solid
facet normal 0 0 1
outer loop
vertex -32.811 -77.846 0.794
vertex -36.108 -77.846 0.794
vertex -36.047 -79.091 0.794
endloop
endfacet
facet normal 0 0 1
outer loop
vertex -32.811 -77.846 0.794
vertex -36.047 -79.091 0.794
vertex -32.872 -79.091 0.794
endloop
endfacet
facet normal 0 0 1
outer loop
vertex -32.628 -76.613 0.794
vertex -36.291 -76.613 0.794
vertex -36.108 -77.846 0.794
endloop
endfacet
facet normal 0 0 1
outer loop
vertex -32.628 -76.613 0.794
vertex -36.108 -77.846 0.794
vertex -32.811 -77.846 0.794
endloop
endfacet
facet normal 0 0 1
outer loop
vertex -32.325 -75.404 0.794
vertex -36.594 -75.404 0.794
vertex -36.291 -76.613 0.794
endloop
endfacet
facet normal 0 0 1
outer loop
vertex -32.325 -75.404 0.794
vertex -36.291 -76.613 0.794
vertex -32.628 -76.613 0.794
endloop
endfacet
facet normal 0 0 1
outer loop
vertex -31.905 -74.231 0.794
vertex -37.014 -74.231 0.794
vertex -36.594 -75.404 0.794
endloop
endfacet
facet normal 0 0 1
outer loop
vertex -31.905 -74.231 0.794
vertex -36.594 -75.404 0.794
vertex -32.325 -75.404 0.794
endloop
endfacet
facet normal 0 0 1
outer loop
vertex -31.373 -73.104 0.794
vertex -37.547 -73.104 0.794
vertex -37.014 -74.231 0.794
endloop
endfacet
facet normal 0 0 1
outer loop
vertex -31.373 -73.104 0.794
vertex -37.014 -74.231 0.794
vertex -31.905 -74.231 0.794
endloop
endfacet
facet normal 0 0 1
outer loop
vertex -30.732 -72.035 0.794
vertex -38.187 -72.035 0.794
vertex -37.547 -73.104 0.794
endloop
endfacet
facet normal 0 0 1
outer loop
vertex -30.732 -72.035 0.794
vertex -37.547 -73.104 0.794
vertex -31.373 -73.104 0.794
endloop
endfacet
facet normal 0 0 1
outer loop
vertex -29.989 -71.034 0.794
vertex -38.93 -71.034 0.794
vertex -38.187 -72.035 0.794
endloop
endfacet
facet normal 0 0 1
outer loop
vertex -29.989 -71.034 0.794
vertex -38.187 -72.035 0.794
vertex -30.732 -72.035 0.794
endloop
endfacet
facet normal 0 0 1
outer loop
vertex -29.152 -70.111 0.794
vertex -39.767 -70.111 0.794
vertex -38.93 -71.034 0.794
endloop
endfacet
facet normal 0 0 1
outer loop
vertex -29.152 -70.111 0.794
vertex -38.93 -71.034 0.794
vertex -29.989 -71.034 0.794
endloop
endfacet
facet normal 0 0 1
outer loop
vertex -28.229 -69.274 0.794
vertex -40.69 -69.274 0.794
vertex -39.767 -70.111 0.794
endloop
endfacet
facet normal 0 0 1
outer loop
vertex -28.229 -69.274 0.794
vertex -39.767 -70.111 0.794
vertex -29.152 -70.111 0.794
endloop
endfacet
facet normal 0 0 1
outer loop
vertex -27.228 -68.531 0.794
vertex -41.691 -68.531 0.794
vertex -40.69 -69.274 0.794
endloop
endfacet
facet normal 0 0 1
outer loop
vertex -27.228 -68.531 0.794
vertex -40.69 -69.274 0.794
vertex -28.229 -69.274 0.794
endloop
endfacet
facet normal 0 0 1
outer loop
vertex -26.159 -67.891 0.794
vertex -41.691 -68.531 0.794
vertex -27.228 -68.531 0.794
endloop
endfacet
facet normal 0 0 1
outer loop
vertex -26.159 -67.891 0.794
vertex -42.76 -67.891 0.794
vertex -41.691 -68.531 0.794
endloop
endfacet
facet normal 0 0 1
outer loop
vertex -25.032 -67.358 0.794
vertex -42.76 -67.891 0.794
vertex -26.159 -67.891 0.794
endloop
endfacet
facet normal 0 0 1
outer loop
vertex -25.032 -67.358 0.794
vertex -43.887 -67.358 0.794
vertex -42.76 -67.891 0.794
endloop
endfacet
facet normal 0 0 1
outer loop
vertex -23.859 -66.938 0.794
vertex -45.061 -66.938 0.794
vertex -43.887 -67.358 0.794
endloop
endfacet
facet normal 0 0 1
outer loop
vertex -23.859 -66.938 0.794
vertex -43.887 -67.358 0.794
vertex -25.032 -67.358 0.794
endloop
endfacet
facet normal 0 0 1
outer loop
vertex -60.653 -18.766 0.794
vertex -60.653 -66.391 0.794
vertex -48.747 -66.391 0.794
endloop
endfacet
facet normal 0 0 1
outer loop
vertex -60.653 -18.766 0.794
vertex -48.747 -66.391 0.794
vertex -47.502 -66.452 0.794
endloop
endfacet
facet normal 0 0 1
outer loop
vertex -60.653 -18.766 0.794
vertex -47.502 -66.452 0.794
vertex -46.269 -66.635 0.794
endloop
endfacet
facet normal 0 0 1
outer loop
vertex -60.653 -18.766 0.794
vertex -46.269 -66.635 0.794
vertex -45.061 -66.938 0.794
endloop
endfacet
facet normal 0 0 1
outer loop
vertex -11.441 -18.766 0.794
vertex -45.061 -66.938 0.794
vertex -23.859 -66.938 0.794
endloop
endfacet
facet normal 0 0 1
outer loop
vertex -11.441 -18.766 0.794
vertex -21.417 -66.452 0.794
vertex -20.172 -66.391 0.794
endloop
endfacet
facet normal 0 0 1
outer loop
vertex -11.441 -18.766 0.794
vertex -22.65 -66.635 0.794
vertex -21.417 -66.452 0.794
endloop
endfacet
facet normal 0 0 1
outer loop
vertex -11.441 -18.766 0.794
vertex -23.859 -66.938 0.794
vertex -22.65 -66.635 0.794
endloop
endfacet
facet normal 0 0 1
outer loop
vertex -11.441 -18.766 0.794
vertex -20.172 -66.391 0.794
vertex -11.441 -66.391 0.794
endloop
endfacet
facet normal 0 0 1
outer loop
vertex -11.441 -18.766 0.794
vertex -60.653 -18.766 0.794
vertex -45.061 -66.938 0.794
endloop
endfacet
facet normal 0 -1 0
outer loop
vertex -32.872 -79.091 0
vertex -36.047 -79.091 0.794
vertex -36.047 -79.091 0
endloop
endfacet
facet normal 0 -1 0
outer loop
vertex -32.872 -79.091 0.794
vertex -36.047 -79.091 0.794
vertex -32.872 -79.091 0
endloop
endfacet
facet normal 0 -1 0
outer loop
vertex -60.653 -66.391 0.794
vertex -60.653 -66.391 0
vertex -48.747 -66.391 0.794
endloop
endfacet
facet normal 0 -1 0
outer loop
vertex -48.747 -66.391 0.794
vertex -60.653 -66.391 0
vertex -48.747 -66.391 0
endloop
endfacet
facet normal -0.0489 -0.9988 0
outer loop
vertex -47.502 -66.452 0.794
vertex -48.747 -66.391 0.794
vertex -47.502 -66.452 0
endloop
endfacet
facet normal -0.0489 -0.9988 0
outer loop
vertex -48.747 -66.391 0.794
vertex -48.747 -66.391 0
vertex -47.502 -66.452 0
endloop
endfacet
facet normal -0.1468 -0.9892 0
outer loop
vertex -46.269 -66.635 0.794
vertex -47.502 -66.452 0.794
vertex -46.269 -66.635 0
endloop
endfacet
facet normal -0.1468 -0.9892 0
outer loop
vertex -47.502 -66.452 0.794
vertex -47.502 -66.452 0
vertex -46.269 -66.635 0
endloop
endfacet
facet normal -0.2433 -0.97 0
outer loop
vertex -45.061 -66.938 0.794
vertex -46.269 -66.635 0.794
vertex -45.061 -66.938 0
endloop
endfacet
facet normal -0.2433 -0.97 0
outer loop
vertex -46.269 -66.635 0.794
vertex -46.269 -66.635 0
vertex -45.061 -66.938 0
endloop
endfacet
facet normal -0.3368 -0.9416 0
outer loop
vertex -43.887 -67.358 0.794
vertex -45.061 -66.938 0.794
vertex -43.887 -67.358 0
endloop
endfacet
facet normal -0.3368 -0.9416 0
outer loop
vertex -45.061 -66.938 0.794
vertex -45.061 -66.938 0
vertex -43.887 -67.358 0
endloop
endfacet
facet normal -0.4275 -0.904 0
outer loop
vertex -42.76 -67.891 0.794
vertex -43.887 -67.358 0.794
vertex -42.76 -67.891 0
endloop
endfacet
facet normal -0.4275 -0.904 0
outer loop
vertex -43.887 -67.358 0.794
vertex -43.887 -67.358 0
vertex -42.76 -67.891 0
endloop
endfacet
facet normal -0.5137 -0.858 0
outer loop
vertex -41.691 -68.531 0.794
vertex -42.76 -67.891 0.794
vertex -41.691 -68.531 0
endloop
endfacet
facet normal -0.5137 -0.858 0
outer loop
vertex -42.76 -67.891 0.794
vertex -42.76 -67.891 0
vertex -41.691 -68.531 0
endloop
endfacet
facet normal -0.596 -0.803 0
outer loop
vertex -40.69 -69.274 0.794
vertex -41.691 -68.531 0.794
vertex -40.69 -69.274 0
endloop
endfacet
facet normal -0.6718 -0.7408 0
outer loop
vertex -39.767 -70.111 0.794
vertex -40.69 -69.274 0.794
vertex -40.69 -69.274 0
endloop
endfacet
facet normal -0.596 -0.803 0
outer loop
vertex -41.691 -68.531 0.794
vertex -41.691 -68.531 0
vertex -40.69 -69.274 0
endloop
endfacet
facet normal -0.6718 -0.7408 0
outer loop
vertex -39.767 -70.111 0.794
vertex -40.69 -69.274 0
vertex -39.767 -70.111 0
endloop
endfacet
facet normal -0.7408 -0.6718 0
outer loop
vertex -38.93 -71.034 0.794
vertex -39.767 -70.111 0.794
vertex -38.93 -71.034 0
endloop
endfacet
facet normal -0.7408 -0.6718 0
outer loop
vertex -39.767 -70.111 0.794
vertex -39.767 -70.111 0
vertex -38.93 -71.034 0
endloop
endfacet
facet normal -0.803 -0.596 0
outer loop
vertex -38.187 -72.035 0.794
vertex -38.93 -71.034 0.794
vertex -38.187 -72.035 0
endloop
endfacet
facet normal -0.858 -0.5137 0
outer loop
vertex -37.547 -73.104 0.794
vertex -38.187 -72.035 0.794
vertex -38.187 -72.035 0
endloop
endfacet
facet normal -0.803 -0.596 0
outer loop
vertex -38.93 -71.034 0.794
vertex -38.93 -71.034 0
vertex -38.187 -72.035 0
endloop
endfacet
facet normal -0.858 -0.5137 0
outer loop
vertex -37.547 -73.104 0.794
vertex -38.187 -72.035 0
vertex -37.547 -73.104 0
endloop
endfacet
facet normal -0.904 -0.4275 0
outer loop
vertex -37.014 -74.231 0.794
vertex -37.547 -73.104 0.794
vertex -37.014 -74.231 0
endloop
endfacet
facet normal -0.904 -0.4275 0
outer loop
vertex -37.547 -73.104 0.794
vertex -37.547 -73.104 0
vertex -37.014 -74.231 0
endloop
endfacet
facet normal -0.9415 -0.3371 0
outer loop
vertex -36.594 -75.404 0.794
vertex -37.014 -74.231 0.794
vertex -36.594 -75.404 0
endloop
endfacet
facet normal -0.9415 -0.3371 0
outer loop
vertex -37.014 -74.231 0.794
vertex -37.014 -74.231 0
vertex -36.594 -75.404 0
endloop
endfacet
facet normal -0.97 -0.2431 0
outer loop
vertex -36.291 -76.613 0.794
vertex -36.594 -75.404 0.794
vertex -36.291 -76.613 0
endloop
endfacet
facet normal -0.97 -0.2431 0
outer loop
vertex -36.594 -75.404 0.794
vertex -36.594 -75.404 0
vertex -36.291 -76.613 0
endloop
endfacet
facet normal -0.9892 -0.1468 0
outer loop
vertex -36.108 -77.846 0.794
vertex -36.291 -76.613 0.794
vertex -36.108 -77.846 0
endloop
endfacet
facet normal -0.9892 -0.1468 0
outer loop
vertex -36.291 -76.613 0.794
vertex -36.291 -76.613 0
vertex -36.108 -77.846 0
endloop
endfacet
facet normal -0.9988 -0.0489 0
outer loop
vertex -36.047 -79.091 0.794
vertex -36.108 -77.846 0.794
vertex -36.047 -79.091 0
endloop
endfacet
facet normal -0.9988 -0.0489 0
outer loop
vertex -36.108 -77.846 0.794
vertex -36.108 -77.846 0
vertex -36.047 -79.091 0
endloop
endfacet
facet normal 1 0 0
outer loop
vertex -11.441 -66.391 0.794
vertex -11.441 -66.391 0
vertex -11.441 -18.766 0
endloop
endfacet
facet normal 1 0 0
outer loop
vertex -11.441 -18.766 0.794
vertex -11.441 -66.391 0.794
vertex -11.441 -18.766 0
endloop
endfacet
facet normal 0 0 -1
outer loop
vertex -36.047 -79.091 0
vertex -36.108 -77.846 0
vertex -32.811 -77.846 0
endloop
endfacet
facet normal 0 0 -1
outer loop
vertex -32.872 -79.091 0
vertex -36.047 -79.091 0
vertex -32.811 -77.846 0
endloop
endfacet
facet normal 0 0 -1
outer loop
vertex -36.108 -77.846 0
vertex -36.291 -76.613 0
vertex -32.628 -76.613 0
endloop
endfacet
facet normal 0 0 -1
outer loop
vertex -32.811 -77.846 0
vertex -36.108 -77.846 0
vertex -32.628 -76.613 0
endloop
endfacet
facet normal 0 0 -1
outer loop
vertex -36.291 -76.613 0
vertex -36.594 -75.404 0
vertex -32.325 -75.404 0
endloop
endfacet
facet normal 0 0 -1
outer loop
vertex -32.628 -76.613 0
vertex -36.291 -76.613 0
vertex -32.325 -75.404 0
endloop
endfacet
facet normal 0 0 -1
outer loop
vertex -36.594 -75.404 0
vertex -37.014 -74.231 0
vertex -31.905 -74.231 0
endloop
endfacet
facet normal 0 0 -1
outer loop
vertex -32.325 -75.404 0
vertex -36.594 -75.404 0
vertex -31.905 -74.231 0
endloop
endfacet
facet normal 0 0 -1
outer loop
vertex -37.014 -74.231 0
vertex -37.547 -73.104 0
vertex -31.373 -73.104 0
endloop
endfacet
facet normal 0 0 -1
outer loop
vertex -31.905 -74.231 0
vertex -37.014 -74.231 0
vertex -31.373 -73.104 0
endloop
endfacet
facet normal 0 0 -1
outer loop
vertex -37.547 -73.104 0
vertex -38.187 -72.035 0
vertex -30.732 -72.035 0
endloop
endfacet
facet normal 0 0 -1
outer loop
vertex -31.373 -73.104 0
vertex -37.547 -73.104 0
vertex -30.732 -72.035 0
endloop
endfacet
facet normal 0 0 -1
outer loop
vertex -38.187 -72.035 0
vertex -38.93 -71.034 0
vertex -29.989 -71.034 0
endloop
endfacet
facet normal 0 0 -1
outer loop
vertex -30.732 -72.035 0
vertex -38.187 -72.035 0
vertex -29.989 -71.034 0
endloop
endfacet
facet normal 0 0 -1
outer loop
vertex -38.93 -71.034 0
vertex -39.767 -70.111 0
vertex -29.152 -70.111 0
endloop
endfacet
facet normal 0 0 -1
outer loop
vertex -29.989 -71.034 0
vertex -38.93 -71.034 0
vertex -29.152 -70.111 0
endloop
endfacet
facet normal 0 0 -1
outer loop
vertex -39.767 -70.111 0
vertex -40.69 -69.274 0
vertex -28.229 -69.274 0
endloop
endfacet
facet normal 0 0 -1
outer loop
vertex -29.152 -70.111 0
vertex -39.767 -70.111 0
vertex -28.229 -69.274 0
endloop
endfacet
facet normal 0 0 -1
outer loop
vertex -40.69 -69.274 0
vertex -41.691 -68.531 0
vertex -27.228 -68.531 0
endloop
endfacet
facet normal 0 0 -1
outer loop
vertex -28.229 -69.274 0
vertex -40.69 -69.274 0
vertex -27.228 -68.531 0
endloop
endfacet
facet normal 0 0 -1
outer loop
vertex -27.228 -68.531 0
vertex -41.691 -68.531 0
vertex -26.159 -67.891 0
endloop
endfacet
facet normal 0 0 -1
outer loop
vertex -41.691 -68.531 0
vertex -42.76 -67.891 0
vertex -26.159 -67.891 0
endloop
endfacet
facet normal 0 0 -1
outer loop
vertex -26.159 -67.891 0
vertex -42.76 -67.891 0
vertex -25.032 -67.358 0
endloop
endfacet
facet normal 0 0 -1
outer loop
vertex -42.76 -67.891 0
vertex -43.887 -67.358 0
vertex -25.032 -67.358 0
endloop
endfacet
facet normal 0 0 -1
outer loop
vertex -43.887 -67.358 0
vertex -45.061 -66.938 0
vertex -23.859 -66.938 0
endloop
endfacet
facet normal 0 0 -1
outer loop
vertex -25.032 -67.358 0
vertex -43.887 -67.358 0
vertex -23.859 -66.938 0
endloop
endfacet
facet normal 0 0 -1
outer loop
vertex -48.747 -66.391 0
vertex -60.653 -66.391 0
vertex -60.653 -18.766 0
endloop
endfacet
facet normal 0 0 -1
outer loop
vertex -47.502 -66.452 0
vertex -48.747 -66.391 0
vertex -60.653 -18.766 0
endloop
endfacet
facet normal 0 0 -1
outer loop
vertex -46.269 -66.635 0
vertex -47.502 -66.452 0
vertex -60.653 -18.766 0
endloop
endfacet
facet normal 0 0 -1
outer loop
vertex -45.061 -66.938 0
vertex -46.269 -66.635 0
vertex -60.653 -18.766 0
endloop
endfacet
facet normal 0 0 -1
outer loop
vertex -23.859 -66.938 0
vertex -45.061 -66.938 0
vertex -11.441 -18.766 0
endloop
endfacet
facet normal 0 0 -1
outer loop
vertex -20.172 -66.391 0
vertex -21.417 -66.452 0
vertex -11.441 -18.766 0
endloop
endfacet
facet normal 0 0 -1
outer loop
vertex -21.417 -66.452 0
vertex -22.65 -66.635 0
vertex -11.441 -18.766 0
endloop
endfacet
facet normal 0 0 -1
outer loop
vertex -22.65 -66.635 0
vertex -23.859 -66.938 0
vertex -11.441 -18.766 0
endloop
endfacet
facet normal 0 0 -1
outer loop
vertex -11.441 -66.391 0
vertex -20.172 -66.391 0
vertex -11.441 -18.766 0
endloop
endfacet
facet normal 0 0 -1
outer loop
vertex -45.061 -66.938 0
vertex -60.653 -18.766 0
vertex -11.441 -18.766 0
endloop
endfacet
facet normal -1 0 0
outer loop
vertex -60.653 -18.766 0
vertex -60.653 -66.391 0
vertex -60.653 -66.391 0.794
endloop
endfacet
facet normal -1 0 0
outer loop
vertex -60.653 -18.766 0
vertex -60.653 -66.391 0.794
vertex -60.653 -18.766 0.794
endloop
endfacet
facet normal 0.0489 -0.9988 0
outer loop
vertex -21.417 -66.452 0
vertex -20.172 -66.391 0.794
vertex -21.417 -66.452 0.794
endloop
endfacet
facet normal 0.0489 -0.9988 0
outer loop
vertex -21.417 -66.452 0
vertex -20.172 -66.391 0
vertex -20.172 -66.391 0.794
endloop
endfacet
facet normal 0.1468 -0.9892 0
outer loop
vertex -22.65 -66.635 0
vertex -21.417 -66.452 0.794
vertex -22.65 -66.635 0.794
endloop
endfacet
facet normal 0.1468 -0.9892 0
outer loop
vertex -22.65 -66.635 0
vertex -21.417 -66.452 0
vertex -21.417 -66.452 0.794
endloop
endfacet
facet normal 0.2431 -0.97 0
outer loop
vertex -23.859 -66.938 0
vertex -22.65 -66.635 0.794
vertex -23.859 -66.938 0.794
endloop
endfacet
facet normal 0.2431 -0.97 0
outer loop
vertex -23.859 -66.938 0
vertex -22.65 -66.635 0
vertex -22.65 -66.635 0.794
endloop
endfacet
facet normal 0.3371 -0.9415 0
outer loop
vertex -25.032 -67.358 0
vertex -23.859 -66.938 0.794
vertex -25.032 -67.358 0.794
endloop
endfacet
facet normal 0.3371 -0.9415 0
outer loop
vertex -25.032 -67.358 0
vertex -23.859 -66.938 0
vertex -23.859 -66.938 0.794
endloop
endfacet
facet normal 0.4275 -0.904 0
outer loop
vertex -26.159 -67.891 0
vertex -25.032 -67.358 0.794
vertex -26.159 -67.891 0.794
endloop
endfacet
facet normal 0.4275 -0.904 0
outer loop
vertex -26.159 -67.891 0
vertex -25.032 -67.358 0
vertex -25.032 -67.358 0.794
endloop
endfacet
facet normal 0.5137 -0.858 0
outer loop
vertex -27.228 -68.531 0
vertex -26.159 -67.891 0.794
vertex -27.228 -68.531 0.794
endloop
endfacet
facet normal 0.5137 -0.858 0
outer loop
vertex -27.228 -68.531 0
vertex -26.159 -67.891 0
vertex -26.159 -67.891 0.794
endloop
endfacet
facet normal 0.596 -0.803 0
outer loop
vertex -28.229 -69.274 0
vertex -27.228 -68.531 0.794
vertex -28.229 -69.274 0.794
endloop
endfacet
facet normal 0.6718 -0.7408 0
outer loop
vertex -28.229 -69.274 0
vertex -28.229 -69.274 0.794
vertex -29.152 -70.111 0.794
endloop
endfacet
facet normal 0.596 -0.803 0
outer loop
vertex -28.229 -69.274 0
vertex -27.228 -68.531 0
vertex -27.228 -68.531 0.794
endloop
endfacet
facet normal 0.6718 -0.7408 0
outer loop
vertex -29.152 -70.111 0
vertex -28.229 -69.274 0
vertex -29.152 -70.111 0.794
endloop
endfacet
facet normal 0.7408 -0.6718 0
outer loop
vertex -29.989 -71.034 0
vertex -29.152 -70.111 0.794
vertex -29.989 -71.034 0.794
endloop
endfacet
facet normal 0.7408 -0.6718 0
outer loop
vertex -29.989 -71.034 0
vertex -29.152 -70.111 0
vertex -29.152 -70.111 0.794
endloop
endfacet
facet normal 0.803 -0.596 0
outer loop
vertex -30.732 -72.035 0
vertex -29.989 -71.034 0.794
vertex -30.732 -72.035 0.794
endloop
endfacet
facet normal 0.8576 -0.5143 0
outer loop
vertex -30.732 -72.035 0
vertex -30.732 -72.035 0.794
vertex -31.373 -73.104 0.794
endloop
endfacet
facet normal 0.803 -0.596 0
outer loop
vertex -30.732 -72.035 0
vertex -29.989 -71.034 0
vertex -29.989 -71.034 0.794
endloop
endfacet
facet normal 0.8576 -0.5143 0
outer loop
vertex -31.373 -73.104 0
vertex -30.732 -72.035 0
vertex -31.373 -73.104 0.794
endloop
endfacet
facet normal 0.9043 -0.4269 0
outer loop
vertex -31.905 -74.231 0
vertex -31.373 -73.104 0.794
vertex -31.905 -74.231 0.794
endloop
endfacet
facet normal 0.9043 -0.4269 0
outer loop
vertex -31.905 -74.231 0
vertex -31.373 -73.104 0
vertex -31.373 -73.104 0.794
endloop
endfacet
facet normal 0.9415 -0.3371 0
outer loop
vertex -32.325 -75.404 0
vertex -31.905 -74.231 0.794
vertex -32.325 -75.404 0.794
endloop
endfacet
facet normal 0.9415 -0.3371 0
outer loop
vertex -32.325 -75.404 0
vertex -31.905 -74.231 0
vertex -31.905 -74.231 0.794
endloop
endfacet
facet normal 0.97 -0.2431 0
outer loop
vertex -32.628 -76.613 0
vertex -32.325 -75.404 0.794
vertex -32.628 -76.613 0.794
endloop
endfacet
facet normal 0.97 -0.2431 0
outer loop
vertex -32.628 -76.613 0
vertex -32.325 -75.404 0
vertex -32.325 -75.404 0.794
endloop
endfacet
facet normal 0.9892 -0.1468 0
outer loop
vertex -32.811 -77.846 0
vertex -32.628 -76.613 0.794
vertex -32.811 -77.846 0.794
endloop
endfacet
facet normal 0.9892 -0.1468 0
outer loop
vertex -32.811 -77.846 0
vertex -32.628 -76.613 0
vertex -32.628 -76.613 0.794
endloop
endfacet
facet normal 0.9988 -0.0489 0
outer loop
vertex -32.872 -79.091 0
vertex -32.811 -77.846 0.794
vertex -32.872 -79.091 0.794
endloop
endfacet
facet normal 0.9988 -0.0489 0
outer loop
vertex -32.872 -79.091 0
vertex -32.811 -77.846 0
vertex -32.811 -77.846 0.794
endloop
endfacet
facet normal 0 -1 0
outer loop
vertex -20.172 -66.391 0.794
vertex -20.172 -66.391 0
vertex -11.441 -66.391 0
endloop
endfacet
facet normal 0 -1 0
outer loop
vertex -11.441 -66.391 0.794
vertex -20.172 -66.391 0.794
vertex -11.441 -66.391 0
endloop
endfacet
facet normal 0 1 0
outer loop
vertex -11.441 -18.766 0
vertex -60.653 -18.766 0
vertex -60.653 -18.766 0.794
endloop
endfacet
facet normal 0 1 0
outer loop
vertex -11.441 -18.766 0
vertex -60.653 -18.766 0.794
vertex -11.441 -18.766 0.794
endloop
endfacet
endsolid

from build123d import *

# Parameters (mm, degrees)
F0_W     = 49.2125
F0_H     = 47.625
F1_DEPTH = 0.79375
F2_W     = 3.175
F2_H     = 12.7
F3_DEPTH = 0.79375
F4_R     = 12.69999


# Not quite as in the source:
# - a fillet or chamfer is up to 0.001 mm smaller than in the source, because OpenCascade refuses the exact size


with BuildPart() as f1:
    # F0 (on Top) → F1 (new body)
    with BuildSketch(Plane.XY):
        with Locations((-36.0471457243, -42.5785098099)):
            Rectangle(F0_W, F0_H)
    extrude(amount=F1_DEPTH)

    # F2 (on face) → F3 (join)
    with BuildSketch(Plane.XY.offset(0.79375)):
        with Locations((-34.4596457243, -72.7410098099)):
            Rectangle(F2_W, F2_H)
    extrude(amount=-F3_DEPTH)

    # F4 (radius 12.7 in the source; OpenCascade refuses exactly that, so slightly less here)
    f4_edges = [f1.edges().sort_by_distance(p)[0] for p in [
        (-36.047146, -66.39101, 0.396875),
        (-32.872146, -66.39101, 0.396875),
    ]]
    fillet(f4_edges, radius=F4_R)


solid = f1.part
